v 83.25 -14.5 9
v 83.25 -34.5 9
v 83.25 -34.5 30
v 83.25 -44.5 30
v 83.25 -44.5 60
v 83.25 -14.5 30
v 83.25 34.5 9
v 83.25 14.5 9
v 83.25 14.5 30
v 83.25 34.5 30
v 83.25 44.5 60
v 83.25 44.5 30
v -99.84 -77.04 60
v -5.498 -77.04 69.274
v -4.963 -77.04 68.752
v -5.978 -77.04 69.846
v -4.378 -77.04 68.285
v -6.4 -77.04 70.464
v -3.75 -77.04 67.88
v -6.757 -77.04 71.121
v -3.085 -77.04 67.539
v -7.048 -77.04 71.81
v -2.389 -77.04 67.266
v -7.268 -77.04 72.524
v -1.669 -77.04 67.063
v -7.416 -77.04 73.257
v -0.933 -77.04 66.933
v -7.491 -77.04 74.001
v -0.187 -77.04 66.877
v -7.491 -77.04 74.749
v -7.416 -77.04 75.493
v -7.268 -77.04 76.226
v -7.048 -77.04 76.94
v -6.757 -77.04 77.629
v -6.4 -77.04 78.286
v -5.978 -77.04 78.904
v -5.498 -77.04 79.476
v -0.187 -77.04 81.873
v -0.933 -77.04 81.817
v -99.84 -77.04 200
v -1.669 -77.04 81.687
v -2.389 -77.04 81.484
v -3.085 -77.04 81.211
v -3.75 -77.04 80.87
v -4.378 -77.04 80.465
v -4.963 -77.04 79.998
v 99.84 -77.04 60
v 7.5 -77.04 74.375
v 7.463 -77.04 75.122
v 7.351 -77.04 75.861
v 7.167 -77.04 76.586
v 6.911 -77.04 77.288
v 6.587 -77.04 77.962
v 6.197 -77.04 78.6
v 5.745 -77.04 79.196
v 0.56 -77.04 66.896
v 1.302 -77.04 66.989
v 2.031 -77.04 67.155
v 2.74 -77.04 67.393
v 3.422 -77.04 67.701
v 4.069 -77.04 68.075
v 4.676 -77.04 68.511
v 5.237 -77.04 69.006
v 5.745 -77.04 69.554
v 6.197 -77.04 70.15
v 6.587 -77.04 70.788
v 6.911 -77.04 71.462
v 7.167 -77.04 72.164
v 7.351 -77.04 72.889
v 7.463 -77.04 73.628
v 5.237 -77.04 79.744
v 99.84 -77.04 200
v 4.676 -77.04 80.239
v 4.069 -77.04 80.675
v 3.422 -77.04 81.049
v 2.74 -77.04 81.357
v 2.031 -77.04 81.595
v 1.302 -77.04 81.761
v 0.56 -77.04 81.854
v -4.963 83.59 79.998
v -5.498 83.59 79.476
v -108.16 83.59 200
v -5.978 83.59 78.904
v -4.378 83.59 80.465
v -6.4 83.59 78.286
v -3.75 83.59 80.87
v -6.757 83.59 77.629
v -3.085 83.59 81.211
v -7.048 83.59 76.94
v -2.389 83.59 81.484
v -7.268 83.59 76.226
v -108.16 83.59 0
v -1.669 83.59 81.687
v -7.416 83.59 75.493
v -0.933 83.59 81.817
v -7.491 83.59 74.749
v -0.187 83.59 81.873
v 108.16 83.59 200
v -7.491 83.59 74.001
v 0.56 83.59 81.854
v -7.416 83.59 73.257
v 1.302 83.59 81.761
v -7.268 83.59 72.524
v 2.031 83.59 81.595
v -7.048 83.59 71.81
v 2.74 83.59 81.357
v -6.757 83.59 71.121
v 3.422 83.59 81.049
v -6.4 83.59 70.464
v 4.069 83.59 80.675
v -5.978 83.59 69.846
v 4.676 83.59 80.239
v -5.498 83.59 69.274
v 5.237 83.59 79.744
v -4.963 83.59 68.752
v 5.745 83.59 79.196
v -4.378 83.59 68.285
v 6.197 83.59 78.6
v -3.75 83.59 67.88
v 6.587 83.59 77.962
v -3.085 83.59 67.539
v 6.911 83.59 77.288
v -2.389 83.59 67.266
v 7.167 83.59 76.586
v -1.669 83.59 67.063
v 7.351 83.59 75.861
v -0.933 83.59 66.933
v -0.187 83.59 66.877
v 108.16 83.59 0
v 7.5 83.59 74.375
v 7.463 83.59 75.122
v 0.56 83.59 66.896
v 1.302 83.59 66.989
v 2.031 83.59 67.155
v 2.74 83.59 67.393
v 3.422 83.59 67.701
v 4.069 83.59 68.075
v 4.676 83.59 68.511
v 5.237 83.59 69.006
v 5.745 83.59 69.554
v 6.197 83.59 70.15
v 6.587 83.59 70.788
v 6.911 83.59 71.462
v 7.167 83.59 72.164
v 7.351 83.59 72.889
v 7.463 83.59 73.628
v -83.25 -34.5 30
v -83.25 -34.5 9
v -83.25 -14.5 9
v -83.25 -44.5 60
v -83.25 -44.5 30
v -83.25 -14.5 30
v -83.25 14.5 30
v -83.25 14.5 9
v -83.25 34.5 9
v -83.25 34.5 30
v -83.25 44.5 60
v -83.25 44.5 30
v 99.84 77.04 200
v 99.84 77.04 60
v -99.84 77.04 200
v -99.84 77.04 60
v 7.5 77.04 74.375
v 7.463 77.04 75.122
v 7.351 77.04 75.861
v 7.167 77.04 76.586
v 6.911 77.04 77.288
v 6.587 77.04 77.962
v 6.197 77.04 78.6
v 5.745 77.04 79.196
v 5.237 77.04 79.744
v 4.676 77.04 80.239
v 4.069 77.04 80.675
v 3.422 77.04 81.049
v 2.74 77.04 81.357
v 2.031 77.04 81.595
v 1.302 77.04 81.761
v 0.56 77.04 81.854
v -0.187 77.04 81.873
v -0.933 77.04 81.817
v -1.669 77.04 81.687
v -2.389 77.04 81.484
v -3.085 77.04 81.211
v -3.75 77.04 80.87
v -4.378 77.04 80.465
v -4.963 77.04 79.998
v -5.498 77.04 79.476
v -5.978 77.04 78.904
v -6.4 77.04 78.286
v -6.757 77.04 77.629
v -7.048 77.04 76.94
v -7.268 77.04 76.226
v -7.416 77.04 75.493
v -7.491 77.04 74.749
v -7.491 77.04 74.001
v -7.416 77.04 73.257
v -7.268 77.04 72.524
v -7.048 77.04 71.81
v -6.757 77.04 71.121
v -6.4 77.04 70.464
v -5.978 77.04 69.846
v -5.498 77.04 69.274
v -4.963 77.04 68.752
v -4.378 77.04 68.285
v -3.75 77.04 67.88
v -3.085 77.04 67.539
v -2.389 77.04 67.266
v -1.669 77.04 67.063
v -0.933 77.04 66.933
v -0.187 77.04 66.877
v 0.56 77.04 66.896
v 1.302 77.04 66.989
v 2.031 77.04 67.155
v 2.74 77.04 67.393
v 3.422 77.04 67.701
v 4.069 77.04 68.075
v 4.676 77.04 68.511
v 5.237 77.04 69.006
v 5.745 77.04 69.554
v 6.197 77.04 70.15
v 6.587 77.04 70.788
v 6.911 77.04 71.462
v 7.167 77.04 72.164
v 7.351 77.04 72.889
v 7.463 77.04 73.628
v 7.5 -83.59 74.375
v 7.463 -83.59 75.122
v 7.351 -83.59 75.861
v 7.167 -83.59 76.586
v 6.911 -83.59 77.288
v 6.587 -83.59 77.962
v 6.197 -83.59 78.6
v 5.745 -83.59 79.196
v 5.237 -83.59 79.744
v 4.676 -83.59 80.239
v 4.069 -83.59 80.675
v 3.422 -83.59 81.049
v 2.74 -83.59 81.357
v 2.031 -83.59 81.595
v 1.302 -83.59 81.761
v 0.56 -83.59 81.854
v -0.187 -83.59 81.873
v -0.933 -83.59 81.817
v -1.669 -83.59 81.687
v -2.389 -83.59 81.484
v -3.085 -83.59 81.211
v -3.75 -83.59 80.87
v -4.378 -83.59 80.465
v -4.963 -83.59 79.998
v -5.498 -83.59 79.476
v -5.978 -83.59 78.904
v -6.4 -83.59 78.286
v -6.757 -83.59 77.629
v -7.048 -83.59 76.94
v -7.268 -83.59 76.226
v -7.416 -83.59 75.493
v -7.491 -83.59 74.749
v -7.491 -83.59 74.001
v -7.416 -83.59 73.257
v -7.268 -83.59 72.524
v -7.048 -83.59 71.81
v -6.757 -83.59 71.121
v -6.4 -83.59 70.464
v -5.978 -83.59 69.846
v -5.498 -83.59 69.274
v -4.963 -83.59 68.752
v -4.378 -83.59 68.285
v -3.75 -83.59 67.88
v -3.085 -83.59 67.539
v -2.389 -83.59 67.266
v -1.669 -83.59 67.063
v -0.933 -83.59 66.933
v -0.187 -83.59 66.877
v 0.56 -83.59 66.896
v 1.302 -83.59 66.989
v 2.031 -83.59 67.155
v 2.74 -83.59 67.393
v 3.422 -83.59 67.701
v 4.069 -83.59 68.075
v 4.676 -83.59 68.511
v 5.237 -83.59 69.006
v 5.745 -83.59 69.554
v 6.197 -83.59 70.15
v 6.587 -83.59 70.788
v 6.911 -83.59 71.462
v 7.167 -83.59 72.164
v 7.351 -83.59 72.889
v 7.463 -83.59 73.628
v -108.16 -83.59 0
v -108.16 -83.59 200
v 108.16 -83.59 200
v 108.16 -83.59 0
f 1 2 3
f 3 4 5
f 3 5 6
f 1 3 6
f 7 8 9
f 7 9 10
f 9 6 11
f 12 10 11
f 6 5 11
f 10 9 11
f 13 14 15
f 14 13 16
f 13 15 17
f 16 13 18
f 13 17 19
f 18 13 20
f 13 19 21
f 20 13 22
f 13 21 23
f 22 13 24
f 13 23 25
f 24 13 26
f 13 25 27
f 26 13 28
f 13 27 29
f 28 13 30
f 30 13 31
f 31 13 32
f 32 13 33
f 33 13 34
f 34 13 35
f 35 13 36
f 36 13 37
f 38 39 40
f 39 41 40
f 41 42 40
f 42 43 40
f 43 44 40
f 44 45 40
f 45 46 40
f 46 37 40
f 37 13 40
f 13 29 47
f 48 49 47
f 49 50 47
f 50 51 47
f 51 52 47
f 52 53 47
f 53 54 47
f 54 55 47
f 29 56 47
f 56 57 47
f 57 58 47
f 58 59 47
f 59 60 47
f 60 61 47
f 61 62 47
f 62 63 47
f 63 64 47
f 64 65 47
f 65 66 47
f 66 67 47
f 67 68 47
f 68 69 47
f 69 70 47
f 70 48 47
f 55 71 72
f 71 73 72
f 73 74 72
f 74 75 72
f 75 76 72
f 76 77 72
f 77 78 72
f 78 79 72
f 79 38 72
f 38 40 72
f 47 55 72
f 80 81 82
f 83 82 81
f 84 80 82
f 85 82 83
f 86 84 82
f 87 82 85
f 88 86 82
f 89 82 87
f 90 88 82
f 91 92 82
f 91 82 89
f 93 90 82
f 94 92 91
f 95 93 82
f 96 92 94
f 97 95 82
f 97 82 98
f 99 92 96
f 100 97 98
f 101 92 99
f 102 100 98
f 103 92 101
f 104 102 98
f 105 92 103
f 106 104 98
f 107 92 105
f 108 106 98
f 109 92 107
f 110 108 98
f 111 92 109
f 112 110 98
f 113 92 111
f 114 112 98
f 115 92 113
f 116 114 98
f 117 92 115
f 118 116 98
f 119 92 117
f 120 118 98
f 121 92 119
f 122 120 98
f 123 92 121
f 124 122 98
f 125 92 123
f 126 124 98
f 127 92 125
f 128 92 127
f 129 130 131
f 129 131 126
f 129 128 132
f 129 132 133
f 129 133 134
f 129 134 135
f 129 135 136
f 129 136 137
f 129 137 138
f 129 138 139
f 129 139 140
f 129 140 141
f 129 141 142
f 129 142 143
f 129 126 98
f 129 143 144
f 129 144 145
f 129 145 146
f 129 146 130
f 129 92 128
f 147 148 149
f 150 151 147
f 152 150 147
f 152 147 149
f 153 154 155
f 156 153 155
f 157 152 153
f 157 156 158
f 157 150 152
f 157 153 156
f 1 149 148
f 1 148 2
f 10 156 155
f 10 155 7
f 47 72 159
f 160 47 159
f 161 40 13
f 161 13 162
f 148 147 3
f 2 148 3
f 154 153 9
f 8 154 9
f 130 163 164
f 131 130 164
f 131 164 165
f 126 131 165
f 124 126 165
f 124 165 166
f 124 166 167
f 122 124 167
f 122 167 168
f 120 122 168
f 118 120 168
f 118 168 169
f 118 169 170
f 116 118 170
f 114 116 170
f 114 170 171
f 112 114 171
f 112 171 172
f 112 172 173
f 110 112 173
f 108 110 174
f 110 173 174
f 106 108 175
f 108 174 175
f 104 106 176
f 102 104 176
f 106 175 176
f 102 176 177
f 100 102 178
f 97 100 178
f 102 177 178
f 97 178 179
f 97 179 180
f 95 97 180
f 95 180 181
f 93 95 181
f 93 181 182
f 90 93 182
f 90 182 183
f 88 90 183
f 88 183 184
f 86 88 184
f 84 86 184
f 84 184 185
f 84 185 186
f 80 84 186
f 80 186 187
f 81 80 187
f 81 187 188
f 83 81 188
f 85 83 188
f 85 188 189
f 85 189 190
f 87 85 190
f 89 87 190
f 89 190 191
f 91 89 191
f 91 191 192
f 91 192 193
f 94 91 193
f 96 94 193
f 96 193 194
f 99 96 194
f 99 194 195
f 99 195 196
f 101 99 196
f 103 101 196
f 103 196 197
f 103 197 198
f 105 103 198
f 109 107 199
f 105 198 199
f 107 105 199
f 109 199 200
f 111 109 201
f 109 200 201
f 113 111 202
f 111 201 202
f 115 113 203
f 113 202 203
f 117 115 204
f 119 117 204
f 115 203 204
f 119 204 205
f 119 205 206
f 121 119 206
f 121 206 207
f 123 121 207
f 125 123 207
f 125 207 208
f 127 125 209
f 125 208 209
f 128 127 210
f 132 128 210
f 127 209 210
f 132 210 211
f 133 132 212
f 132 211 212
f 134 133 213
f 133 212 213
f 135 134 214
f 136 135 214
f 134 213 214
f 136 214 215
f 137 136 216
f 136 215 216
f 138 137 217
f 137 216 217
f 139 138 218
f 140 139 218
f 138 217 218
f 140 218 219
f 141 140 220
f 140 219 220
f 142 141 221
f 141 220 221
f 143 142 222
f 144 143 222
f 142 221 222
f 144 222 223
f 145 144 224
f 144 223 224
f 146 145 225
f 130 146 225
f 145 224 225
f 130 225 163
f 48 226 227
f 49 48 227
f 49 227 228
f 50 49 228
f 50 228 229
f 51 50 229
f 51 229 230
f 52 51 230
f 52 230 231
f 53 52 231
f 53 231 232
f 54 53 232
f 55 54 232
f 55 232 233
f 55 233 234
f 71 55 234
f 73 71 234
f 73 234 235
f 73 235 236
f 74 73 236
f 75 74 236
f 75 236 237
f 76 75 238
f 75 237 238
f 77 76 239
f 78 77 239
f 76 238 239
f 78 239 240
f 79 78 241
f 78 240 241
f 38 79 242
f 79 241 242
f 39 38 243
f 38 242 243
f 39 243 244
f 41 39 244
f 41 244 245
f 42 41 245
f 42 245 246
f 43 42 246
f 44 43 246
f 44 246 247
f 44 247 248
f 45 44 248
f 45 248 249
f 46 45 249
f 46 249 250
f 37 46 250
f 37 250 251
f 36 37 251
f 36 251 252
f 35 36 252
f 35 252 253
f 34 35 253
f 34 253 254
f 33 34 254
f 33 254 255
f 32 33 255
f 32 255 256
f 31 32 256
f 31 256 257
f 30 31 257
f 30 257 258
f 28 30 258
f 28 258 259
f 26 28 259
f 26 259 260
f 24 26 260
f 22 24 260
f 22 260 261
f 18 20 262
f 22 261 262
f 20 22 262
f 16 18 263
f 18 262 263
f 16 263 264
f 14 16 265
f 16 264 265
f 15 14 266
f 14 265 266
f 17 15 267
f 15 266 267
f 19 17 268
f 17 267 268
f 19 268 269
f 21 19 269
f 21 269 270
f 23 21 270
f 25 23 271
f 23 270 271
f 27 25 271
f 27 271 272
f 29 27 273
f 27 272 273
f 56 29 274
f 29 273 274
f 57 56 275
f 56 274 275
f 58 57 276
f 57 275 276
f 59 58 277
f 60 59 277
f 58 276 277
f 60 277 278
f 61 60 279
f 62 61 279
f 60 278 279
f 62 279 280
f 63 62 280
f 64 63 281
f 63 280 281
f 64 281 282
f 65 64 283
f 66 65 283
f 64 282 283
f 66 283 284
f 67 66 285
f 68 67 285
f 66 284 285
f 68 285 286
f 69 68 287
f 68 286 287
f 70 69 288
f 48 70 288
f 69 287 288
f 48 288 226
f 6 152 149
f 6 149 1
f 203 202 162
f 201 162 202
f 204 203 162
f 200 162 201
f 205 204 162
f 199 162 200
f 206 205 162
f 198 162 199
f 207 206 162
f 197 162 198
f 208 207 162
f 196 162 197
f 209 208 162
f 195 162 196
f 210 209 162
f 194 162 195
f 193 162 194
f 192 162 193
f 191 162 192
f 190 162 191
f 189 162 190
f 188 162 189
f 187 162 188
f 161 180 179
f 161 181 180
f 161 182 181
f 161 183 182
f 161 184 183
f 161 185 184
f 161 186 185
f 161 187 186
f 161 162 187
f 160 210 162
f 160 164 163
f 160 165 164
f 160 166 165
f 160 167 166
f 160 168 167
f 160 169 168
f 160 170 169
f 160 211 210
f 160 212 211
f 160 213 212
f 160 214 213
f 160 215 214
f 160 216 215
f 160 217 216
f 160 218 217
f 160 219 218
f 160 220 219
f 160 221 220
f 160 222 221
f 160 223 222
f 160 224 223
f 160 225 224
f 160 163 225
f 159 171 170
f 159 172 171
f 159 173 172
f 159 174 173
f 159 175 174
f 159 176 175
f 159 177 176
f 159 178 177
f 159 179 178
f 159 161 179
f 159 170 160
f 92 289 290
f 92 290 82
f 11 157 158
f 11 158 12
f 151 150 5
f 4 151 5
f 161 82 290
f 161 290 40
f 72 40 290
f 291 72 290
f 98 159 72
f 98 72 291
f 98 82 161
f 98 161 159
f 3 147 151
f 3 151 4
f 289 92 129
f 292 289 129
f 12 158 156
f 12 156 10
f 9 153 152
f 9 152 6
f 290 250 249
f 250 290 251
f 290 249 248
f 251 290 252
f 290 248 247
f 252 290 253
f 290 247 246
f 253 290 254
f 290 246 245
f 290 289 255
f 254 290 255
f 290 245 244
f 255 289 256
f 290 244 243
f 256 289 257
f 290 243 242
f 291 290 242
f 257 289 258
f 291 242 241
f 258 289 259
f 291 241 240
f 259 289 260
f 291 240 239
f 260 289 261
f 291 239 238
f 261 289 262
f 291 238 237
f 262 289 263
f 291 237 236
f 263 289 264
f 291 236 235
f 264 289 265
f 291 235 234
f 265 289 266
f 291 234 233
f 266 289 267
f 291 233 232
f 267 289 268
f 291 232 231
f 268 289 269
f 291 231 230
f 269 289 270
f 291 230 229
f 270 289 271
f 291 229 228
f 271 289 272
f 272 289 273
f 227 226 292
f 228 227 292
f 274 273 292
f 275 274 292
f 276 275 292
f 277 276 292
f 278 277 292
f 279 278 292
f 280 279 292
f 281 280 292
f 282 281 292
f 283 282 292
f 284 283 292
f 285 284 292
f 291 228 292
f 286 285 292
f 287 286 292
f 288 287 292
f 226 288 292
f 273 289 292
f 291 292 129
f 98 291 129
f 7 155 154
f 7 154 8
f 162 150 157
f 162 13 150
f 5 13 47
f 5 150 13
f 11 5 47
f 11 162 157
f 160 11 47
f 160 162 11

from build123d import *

# Parameters (mm, degrees)
SKETCH_W        = 216.32
SKETCH_H        = 167.18
PAD_DEPTH       = 200
SKETCH001_W     = 199.68
SKETCH001_H     = 154.08
POCKET_DEPTH    = 140
SKETCH002_W     = 166.5
SKETCH002_H     = 89
POCKET001_DEPTH = 30
SKETCH003_W     = 166.5
SKETCH003_H     = 20
POCKET002_DEPTH = 21
SKETCH004_R     = 7.5
HOLE_DEPTH      = 200


with BuildPart() as part:
    # Sketch → Pad (new body)
    with BuildSketch(Plane.XY):
        Rectangle(SKETCH_W, SKETCH_H)
    extrude(amount=PAD_DEPTH)

    # Sketch001 (on Face6 of Pad) → Pocket (cut)
    with BuildSketch(Plane.XY.offset(200)):
        Rectangle(SKETCH001_W, SKETCH001_H)
    extrude(amount=-POCKET_DEPTH, mode=Mode.SUBTRACT)

    # Sketch002 (on Face11 of Pocket) → Pocket001 (cut)
    with BuildSketch(Plane.XY.offset(60)):
        Rectangle(SKETCH002_W, SKETCH002_H)
    extrude(amount=-POCKET001_DEPTH, mode=Mode.SUBTRACT)

    # Sketch003 (on Face16 of Pocket001) → Pocket002 (cut)
    with BuildSketch(Plane.XY.offset(30)):
        with Locations((0, 24.5)):
            Rectangle(SKETCH003_W, SKETCH003_H)
        with Locations((0, -24.5)):
            Rectangle(SKETCH003_W, SKETCH003_H)
    extrude(amount=-POCKET002_DEPTH, mode=Mode.SUBTRACT)

    # Sketch004 (on Face6 of Pocket002) → Hole (cut)
    with BuildSketch(Plane.XZ.offset(83.59)):
        with Locations((0, 74.375)):
            Circle(SKETCH004_R)
    extrude(amount=-HOLE_DEPTH, mode=Mode.SUBTRACT)


solid = part.part
